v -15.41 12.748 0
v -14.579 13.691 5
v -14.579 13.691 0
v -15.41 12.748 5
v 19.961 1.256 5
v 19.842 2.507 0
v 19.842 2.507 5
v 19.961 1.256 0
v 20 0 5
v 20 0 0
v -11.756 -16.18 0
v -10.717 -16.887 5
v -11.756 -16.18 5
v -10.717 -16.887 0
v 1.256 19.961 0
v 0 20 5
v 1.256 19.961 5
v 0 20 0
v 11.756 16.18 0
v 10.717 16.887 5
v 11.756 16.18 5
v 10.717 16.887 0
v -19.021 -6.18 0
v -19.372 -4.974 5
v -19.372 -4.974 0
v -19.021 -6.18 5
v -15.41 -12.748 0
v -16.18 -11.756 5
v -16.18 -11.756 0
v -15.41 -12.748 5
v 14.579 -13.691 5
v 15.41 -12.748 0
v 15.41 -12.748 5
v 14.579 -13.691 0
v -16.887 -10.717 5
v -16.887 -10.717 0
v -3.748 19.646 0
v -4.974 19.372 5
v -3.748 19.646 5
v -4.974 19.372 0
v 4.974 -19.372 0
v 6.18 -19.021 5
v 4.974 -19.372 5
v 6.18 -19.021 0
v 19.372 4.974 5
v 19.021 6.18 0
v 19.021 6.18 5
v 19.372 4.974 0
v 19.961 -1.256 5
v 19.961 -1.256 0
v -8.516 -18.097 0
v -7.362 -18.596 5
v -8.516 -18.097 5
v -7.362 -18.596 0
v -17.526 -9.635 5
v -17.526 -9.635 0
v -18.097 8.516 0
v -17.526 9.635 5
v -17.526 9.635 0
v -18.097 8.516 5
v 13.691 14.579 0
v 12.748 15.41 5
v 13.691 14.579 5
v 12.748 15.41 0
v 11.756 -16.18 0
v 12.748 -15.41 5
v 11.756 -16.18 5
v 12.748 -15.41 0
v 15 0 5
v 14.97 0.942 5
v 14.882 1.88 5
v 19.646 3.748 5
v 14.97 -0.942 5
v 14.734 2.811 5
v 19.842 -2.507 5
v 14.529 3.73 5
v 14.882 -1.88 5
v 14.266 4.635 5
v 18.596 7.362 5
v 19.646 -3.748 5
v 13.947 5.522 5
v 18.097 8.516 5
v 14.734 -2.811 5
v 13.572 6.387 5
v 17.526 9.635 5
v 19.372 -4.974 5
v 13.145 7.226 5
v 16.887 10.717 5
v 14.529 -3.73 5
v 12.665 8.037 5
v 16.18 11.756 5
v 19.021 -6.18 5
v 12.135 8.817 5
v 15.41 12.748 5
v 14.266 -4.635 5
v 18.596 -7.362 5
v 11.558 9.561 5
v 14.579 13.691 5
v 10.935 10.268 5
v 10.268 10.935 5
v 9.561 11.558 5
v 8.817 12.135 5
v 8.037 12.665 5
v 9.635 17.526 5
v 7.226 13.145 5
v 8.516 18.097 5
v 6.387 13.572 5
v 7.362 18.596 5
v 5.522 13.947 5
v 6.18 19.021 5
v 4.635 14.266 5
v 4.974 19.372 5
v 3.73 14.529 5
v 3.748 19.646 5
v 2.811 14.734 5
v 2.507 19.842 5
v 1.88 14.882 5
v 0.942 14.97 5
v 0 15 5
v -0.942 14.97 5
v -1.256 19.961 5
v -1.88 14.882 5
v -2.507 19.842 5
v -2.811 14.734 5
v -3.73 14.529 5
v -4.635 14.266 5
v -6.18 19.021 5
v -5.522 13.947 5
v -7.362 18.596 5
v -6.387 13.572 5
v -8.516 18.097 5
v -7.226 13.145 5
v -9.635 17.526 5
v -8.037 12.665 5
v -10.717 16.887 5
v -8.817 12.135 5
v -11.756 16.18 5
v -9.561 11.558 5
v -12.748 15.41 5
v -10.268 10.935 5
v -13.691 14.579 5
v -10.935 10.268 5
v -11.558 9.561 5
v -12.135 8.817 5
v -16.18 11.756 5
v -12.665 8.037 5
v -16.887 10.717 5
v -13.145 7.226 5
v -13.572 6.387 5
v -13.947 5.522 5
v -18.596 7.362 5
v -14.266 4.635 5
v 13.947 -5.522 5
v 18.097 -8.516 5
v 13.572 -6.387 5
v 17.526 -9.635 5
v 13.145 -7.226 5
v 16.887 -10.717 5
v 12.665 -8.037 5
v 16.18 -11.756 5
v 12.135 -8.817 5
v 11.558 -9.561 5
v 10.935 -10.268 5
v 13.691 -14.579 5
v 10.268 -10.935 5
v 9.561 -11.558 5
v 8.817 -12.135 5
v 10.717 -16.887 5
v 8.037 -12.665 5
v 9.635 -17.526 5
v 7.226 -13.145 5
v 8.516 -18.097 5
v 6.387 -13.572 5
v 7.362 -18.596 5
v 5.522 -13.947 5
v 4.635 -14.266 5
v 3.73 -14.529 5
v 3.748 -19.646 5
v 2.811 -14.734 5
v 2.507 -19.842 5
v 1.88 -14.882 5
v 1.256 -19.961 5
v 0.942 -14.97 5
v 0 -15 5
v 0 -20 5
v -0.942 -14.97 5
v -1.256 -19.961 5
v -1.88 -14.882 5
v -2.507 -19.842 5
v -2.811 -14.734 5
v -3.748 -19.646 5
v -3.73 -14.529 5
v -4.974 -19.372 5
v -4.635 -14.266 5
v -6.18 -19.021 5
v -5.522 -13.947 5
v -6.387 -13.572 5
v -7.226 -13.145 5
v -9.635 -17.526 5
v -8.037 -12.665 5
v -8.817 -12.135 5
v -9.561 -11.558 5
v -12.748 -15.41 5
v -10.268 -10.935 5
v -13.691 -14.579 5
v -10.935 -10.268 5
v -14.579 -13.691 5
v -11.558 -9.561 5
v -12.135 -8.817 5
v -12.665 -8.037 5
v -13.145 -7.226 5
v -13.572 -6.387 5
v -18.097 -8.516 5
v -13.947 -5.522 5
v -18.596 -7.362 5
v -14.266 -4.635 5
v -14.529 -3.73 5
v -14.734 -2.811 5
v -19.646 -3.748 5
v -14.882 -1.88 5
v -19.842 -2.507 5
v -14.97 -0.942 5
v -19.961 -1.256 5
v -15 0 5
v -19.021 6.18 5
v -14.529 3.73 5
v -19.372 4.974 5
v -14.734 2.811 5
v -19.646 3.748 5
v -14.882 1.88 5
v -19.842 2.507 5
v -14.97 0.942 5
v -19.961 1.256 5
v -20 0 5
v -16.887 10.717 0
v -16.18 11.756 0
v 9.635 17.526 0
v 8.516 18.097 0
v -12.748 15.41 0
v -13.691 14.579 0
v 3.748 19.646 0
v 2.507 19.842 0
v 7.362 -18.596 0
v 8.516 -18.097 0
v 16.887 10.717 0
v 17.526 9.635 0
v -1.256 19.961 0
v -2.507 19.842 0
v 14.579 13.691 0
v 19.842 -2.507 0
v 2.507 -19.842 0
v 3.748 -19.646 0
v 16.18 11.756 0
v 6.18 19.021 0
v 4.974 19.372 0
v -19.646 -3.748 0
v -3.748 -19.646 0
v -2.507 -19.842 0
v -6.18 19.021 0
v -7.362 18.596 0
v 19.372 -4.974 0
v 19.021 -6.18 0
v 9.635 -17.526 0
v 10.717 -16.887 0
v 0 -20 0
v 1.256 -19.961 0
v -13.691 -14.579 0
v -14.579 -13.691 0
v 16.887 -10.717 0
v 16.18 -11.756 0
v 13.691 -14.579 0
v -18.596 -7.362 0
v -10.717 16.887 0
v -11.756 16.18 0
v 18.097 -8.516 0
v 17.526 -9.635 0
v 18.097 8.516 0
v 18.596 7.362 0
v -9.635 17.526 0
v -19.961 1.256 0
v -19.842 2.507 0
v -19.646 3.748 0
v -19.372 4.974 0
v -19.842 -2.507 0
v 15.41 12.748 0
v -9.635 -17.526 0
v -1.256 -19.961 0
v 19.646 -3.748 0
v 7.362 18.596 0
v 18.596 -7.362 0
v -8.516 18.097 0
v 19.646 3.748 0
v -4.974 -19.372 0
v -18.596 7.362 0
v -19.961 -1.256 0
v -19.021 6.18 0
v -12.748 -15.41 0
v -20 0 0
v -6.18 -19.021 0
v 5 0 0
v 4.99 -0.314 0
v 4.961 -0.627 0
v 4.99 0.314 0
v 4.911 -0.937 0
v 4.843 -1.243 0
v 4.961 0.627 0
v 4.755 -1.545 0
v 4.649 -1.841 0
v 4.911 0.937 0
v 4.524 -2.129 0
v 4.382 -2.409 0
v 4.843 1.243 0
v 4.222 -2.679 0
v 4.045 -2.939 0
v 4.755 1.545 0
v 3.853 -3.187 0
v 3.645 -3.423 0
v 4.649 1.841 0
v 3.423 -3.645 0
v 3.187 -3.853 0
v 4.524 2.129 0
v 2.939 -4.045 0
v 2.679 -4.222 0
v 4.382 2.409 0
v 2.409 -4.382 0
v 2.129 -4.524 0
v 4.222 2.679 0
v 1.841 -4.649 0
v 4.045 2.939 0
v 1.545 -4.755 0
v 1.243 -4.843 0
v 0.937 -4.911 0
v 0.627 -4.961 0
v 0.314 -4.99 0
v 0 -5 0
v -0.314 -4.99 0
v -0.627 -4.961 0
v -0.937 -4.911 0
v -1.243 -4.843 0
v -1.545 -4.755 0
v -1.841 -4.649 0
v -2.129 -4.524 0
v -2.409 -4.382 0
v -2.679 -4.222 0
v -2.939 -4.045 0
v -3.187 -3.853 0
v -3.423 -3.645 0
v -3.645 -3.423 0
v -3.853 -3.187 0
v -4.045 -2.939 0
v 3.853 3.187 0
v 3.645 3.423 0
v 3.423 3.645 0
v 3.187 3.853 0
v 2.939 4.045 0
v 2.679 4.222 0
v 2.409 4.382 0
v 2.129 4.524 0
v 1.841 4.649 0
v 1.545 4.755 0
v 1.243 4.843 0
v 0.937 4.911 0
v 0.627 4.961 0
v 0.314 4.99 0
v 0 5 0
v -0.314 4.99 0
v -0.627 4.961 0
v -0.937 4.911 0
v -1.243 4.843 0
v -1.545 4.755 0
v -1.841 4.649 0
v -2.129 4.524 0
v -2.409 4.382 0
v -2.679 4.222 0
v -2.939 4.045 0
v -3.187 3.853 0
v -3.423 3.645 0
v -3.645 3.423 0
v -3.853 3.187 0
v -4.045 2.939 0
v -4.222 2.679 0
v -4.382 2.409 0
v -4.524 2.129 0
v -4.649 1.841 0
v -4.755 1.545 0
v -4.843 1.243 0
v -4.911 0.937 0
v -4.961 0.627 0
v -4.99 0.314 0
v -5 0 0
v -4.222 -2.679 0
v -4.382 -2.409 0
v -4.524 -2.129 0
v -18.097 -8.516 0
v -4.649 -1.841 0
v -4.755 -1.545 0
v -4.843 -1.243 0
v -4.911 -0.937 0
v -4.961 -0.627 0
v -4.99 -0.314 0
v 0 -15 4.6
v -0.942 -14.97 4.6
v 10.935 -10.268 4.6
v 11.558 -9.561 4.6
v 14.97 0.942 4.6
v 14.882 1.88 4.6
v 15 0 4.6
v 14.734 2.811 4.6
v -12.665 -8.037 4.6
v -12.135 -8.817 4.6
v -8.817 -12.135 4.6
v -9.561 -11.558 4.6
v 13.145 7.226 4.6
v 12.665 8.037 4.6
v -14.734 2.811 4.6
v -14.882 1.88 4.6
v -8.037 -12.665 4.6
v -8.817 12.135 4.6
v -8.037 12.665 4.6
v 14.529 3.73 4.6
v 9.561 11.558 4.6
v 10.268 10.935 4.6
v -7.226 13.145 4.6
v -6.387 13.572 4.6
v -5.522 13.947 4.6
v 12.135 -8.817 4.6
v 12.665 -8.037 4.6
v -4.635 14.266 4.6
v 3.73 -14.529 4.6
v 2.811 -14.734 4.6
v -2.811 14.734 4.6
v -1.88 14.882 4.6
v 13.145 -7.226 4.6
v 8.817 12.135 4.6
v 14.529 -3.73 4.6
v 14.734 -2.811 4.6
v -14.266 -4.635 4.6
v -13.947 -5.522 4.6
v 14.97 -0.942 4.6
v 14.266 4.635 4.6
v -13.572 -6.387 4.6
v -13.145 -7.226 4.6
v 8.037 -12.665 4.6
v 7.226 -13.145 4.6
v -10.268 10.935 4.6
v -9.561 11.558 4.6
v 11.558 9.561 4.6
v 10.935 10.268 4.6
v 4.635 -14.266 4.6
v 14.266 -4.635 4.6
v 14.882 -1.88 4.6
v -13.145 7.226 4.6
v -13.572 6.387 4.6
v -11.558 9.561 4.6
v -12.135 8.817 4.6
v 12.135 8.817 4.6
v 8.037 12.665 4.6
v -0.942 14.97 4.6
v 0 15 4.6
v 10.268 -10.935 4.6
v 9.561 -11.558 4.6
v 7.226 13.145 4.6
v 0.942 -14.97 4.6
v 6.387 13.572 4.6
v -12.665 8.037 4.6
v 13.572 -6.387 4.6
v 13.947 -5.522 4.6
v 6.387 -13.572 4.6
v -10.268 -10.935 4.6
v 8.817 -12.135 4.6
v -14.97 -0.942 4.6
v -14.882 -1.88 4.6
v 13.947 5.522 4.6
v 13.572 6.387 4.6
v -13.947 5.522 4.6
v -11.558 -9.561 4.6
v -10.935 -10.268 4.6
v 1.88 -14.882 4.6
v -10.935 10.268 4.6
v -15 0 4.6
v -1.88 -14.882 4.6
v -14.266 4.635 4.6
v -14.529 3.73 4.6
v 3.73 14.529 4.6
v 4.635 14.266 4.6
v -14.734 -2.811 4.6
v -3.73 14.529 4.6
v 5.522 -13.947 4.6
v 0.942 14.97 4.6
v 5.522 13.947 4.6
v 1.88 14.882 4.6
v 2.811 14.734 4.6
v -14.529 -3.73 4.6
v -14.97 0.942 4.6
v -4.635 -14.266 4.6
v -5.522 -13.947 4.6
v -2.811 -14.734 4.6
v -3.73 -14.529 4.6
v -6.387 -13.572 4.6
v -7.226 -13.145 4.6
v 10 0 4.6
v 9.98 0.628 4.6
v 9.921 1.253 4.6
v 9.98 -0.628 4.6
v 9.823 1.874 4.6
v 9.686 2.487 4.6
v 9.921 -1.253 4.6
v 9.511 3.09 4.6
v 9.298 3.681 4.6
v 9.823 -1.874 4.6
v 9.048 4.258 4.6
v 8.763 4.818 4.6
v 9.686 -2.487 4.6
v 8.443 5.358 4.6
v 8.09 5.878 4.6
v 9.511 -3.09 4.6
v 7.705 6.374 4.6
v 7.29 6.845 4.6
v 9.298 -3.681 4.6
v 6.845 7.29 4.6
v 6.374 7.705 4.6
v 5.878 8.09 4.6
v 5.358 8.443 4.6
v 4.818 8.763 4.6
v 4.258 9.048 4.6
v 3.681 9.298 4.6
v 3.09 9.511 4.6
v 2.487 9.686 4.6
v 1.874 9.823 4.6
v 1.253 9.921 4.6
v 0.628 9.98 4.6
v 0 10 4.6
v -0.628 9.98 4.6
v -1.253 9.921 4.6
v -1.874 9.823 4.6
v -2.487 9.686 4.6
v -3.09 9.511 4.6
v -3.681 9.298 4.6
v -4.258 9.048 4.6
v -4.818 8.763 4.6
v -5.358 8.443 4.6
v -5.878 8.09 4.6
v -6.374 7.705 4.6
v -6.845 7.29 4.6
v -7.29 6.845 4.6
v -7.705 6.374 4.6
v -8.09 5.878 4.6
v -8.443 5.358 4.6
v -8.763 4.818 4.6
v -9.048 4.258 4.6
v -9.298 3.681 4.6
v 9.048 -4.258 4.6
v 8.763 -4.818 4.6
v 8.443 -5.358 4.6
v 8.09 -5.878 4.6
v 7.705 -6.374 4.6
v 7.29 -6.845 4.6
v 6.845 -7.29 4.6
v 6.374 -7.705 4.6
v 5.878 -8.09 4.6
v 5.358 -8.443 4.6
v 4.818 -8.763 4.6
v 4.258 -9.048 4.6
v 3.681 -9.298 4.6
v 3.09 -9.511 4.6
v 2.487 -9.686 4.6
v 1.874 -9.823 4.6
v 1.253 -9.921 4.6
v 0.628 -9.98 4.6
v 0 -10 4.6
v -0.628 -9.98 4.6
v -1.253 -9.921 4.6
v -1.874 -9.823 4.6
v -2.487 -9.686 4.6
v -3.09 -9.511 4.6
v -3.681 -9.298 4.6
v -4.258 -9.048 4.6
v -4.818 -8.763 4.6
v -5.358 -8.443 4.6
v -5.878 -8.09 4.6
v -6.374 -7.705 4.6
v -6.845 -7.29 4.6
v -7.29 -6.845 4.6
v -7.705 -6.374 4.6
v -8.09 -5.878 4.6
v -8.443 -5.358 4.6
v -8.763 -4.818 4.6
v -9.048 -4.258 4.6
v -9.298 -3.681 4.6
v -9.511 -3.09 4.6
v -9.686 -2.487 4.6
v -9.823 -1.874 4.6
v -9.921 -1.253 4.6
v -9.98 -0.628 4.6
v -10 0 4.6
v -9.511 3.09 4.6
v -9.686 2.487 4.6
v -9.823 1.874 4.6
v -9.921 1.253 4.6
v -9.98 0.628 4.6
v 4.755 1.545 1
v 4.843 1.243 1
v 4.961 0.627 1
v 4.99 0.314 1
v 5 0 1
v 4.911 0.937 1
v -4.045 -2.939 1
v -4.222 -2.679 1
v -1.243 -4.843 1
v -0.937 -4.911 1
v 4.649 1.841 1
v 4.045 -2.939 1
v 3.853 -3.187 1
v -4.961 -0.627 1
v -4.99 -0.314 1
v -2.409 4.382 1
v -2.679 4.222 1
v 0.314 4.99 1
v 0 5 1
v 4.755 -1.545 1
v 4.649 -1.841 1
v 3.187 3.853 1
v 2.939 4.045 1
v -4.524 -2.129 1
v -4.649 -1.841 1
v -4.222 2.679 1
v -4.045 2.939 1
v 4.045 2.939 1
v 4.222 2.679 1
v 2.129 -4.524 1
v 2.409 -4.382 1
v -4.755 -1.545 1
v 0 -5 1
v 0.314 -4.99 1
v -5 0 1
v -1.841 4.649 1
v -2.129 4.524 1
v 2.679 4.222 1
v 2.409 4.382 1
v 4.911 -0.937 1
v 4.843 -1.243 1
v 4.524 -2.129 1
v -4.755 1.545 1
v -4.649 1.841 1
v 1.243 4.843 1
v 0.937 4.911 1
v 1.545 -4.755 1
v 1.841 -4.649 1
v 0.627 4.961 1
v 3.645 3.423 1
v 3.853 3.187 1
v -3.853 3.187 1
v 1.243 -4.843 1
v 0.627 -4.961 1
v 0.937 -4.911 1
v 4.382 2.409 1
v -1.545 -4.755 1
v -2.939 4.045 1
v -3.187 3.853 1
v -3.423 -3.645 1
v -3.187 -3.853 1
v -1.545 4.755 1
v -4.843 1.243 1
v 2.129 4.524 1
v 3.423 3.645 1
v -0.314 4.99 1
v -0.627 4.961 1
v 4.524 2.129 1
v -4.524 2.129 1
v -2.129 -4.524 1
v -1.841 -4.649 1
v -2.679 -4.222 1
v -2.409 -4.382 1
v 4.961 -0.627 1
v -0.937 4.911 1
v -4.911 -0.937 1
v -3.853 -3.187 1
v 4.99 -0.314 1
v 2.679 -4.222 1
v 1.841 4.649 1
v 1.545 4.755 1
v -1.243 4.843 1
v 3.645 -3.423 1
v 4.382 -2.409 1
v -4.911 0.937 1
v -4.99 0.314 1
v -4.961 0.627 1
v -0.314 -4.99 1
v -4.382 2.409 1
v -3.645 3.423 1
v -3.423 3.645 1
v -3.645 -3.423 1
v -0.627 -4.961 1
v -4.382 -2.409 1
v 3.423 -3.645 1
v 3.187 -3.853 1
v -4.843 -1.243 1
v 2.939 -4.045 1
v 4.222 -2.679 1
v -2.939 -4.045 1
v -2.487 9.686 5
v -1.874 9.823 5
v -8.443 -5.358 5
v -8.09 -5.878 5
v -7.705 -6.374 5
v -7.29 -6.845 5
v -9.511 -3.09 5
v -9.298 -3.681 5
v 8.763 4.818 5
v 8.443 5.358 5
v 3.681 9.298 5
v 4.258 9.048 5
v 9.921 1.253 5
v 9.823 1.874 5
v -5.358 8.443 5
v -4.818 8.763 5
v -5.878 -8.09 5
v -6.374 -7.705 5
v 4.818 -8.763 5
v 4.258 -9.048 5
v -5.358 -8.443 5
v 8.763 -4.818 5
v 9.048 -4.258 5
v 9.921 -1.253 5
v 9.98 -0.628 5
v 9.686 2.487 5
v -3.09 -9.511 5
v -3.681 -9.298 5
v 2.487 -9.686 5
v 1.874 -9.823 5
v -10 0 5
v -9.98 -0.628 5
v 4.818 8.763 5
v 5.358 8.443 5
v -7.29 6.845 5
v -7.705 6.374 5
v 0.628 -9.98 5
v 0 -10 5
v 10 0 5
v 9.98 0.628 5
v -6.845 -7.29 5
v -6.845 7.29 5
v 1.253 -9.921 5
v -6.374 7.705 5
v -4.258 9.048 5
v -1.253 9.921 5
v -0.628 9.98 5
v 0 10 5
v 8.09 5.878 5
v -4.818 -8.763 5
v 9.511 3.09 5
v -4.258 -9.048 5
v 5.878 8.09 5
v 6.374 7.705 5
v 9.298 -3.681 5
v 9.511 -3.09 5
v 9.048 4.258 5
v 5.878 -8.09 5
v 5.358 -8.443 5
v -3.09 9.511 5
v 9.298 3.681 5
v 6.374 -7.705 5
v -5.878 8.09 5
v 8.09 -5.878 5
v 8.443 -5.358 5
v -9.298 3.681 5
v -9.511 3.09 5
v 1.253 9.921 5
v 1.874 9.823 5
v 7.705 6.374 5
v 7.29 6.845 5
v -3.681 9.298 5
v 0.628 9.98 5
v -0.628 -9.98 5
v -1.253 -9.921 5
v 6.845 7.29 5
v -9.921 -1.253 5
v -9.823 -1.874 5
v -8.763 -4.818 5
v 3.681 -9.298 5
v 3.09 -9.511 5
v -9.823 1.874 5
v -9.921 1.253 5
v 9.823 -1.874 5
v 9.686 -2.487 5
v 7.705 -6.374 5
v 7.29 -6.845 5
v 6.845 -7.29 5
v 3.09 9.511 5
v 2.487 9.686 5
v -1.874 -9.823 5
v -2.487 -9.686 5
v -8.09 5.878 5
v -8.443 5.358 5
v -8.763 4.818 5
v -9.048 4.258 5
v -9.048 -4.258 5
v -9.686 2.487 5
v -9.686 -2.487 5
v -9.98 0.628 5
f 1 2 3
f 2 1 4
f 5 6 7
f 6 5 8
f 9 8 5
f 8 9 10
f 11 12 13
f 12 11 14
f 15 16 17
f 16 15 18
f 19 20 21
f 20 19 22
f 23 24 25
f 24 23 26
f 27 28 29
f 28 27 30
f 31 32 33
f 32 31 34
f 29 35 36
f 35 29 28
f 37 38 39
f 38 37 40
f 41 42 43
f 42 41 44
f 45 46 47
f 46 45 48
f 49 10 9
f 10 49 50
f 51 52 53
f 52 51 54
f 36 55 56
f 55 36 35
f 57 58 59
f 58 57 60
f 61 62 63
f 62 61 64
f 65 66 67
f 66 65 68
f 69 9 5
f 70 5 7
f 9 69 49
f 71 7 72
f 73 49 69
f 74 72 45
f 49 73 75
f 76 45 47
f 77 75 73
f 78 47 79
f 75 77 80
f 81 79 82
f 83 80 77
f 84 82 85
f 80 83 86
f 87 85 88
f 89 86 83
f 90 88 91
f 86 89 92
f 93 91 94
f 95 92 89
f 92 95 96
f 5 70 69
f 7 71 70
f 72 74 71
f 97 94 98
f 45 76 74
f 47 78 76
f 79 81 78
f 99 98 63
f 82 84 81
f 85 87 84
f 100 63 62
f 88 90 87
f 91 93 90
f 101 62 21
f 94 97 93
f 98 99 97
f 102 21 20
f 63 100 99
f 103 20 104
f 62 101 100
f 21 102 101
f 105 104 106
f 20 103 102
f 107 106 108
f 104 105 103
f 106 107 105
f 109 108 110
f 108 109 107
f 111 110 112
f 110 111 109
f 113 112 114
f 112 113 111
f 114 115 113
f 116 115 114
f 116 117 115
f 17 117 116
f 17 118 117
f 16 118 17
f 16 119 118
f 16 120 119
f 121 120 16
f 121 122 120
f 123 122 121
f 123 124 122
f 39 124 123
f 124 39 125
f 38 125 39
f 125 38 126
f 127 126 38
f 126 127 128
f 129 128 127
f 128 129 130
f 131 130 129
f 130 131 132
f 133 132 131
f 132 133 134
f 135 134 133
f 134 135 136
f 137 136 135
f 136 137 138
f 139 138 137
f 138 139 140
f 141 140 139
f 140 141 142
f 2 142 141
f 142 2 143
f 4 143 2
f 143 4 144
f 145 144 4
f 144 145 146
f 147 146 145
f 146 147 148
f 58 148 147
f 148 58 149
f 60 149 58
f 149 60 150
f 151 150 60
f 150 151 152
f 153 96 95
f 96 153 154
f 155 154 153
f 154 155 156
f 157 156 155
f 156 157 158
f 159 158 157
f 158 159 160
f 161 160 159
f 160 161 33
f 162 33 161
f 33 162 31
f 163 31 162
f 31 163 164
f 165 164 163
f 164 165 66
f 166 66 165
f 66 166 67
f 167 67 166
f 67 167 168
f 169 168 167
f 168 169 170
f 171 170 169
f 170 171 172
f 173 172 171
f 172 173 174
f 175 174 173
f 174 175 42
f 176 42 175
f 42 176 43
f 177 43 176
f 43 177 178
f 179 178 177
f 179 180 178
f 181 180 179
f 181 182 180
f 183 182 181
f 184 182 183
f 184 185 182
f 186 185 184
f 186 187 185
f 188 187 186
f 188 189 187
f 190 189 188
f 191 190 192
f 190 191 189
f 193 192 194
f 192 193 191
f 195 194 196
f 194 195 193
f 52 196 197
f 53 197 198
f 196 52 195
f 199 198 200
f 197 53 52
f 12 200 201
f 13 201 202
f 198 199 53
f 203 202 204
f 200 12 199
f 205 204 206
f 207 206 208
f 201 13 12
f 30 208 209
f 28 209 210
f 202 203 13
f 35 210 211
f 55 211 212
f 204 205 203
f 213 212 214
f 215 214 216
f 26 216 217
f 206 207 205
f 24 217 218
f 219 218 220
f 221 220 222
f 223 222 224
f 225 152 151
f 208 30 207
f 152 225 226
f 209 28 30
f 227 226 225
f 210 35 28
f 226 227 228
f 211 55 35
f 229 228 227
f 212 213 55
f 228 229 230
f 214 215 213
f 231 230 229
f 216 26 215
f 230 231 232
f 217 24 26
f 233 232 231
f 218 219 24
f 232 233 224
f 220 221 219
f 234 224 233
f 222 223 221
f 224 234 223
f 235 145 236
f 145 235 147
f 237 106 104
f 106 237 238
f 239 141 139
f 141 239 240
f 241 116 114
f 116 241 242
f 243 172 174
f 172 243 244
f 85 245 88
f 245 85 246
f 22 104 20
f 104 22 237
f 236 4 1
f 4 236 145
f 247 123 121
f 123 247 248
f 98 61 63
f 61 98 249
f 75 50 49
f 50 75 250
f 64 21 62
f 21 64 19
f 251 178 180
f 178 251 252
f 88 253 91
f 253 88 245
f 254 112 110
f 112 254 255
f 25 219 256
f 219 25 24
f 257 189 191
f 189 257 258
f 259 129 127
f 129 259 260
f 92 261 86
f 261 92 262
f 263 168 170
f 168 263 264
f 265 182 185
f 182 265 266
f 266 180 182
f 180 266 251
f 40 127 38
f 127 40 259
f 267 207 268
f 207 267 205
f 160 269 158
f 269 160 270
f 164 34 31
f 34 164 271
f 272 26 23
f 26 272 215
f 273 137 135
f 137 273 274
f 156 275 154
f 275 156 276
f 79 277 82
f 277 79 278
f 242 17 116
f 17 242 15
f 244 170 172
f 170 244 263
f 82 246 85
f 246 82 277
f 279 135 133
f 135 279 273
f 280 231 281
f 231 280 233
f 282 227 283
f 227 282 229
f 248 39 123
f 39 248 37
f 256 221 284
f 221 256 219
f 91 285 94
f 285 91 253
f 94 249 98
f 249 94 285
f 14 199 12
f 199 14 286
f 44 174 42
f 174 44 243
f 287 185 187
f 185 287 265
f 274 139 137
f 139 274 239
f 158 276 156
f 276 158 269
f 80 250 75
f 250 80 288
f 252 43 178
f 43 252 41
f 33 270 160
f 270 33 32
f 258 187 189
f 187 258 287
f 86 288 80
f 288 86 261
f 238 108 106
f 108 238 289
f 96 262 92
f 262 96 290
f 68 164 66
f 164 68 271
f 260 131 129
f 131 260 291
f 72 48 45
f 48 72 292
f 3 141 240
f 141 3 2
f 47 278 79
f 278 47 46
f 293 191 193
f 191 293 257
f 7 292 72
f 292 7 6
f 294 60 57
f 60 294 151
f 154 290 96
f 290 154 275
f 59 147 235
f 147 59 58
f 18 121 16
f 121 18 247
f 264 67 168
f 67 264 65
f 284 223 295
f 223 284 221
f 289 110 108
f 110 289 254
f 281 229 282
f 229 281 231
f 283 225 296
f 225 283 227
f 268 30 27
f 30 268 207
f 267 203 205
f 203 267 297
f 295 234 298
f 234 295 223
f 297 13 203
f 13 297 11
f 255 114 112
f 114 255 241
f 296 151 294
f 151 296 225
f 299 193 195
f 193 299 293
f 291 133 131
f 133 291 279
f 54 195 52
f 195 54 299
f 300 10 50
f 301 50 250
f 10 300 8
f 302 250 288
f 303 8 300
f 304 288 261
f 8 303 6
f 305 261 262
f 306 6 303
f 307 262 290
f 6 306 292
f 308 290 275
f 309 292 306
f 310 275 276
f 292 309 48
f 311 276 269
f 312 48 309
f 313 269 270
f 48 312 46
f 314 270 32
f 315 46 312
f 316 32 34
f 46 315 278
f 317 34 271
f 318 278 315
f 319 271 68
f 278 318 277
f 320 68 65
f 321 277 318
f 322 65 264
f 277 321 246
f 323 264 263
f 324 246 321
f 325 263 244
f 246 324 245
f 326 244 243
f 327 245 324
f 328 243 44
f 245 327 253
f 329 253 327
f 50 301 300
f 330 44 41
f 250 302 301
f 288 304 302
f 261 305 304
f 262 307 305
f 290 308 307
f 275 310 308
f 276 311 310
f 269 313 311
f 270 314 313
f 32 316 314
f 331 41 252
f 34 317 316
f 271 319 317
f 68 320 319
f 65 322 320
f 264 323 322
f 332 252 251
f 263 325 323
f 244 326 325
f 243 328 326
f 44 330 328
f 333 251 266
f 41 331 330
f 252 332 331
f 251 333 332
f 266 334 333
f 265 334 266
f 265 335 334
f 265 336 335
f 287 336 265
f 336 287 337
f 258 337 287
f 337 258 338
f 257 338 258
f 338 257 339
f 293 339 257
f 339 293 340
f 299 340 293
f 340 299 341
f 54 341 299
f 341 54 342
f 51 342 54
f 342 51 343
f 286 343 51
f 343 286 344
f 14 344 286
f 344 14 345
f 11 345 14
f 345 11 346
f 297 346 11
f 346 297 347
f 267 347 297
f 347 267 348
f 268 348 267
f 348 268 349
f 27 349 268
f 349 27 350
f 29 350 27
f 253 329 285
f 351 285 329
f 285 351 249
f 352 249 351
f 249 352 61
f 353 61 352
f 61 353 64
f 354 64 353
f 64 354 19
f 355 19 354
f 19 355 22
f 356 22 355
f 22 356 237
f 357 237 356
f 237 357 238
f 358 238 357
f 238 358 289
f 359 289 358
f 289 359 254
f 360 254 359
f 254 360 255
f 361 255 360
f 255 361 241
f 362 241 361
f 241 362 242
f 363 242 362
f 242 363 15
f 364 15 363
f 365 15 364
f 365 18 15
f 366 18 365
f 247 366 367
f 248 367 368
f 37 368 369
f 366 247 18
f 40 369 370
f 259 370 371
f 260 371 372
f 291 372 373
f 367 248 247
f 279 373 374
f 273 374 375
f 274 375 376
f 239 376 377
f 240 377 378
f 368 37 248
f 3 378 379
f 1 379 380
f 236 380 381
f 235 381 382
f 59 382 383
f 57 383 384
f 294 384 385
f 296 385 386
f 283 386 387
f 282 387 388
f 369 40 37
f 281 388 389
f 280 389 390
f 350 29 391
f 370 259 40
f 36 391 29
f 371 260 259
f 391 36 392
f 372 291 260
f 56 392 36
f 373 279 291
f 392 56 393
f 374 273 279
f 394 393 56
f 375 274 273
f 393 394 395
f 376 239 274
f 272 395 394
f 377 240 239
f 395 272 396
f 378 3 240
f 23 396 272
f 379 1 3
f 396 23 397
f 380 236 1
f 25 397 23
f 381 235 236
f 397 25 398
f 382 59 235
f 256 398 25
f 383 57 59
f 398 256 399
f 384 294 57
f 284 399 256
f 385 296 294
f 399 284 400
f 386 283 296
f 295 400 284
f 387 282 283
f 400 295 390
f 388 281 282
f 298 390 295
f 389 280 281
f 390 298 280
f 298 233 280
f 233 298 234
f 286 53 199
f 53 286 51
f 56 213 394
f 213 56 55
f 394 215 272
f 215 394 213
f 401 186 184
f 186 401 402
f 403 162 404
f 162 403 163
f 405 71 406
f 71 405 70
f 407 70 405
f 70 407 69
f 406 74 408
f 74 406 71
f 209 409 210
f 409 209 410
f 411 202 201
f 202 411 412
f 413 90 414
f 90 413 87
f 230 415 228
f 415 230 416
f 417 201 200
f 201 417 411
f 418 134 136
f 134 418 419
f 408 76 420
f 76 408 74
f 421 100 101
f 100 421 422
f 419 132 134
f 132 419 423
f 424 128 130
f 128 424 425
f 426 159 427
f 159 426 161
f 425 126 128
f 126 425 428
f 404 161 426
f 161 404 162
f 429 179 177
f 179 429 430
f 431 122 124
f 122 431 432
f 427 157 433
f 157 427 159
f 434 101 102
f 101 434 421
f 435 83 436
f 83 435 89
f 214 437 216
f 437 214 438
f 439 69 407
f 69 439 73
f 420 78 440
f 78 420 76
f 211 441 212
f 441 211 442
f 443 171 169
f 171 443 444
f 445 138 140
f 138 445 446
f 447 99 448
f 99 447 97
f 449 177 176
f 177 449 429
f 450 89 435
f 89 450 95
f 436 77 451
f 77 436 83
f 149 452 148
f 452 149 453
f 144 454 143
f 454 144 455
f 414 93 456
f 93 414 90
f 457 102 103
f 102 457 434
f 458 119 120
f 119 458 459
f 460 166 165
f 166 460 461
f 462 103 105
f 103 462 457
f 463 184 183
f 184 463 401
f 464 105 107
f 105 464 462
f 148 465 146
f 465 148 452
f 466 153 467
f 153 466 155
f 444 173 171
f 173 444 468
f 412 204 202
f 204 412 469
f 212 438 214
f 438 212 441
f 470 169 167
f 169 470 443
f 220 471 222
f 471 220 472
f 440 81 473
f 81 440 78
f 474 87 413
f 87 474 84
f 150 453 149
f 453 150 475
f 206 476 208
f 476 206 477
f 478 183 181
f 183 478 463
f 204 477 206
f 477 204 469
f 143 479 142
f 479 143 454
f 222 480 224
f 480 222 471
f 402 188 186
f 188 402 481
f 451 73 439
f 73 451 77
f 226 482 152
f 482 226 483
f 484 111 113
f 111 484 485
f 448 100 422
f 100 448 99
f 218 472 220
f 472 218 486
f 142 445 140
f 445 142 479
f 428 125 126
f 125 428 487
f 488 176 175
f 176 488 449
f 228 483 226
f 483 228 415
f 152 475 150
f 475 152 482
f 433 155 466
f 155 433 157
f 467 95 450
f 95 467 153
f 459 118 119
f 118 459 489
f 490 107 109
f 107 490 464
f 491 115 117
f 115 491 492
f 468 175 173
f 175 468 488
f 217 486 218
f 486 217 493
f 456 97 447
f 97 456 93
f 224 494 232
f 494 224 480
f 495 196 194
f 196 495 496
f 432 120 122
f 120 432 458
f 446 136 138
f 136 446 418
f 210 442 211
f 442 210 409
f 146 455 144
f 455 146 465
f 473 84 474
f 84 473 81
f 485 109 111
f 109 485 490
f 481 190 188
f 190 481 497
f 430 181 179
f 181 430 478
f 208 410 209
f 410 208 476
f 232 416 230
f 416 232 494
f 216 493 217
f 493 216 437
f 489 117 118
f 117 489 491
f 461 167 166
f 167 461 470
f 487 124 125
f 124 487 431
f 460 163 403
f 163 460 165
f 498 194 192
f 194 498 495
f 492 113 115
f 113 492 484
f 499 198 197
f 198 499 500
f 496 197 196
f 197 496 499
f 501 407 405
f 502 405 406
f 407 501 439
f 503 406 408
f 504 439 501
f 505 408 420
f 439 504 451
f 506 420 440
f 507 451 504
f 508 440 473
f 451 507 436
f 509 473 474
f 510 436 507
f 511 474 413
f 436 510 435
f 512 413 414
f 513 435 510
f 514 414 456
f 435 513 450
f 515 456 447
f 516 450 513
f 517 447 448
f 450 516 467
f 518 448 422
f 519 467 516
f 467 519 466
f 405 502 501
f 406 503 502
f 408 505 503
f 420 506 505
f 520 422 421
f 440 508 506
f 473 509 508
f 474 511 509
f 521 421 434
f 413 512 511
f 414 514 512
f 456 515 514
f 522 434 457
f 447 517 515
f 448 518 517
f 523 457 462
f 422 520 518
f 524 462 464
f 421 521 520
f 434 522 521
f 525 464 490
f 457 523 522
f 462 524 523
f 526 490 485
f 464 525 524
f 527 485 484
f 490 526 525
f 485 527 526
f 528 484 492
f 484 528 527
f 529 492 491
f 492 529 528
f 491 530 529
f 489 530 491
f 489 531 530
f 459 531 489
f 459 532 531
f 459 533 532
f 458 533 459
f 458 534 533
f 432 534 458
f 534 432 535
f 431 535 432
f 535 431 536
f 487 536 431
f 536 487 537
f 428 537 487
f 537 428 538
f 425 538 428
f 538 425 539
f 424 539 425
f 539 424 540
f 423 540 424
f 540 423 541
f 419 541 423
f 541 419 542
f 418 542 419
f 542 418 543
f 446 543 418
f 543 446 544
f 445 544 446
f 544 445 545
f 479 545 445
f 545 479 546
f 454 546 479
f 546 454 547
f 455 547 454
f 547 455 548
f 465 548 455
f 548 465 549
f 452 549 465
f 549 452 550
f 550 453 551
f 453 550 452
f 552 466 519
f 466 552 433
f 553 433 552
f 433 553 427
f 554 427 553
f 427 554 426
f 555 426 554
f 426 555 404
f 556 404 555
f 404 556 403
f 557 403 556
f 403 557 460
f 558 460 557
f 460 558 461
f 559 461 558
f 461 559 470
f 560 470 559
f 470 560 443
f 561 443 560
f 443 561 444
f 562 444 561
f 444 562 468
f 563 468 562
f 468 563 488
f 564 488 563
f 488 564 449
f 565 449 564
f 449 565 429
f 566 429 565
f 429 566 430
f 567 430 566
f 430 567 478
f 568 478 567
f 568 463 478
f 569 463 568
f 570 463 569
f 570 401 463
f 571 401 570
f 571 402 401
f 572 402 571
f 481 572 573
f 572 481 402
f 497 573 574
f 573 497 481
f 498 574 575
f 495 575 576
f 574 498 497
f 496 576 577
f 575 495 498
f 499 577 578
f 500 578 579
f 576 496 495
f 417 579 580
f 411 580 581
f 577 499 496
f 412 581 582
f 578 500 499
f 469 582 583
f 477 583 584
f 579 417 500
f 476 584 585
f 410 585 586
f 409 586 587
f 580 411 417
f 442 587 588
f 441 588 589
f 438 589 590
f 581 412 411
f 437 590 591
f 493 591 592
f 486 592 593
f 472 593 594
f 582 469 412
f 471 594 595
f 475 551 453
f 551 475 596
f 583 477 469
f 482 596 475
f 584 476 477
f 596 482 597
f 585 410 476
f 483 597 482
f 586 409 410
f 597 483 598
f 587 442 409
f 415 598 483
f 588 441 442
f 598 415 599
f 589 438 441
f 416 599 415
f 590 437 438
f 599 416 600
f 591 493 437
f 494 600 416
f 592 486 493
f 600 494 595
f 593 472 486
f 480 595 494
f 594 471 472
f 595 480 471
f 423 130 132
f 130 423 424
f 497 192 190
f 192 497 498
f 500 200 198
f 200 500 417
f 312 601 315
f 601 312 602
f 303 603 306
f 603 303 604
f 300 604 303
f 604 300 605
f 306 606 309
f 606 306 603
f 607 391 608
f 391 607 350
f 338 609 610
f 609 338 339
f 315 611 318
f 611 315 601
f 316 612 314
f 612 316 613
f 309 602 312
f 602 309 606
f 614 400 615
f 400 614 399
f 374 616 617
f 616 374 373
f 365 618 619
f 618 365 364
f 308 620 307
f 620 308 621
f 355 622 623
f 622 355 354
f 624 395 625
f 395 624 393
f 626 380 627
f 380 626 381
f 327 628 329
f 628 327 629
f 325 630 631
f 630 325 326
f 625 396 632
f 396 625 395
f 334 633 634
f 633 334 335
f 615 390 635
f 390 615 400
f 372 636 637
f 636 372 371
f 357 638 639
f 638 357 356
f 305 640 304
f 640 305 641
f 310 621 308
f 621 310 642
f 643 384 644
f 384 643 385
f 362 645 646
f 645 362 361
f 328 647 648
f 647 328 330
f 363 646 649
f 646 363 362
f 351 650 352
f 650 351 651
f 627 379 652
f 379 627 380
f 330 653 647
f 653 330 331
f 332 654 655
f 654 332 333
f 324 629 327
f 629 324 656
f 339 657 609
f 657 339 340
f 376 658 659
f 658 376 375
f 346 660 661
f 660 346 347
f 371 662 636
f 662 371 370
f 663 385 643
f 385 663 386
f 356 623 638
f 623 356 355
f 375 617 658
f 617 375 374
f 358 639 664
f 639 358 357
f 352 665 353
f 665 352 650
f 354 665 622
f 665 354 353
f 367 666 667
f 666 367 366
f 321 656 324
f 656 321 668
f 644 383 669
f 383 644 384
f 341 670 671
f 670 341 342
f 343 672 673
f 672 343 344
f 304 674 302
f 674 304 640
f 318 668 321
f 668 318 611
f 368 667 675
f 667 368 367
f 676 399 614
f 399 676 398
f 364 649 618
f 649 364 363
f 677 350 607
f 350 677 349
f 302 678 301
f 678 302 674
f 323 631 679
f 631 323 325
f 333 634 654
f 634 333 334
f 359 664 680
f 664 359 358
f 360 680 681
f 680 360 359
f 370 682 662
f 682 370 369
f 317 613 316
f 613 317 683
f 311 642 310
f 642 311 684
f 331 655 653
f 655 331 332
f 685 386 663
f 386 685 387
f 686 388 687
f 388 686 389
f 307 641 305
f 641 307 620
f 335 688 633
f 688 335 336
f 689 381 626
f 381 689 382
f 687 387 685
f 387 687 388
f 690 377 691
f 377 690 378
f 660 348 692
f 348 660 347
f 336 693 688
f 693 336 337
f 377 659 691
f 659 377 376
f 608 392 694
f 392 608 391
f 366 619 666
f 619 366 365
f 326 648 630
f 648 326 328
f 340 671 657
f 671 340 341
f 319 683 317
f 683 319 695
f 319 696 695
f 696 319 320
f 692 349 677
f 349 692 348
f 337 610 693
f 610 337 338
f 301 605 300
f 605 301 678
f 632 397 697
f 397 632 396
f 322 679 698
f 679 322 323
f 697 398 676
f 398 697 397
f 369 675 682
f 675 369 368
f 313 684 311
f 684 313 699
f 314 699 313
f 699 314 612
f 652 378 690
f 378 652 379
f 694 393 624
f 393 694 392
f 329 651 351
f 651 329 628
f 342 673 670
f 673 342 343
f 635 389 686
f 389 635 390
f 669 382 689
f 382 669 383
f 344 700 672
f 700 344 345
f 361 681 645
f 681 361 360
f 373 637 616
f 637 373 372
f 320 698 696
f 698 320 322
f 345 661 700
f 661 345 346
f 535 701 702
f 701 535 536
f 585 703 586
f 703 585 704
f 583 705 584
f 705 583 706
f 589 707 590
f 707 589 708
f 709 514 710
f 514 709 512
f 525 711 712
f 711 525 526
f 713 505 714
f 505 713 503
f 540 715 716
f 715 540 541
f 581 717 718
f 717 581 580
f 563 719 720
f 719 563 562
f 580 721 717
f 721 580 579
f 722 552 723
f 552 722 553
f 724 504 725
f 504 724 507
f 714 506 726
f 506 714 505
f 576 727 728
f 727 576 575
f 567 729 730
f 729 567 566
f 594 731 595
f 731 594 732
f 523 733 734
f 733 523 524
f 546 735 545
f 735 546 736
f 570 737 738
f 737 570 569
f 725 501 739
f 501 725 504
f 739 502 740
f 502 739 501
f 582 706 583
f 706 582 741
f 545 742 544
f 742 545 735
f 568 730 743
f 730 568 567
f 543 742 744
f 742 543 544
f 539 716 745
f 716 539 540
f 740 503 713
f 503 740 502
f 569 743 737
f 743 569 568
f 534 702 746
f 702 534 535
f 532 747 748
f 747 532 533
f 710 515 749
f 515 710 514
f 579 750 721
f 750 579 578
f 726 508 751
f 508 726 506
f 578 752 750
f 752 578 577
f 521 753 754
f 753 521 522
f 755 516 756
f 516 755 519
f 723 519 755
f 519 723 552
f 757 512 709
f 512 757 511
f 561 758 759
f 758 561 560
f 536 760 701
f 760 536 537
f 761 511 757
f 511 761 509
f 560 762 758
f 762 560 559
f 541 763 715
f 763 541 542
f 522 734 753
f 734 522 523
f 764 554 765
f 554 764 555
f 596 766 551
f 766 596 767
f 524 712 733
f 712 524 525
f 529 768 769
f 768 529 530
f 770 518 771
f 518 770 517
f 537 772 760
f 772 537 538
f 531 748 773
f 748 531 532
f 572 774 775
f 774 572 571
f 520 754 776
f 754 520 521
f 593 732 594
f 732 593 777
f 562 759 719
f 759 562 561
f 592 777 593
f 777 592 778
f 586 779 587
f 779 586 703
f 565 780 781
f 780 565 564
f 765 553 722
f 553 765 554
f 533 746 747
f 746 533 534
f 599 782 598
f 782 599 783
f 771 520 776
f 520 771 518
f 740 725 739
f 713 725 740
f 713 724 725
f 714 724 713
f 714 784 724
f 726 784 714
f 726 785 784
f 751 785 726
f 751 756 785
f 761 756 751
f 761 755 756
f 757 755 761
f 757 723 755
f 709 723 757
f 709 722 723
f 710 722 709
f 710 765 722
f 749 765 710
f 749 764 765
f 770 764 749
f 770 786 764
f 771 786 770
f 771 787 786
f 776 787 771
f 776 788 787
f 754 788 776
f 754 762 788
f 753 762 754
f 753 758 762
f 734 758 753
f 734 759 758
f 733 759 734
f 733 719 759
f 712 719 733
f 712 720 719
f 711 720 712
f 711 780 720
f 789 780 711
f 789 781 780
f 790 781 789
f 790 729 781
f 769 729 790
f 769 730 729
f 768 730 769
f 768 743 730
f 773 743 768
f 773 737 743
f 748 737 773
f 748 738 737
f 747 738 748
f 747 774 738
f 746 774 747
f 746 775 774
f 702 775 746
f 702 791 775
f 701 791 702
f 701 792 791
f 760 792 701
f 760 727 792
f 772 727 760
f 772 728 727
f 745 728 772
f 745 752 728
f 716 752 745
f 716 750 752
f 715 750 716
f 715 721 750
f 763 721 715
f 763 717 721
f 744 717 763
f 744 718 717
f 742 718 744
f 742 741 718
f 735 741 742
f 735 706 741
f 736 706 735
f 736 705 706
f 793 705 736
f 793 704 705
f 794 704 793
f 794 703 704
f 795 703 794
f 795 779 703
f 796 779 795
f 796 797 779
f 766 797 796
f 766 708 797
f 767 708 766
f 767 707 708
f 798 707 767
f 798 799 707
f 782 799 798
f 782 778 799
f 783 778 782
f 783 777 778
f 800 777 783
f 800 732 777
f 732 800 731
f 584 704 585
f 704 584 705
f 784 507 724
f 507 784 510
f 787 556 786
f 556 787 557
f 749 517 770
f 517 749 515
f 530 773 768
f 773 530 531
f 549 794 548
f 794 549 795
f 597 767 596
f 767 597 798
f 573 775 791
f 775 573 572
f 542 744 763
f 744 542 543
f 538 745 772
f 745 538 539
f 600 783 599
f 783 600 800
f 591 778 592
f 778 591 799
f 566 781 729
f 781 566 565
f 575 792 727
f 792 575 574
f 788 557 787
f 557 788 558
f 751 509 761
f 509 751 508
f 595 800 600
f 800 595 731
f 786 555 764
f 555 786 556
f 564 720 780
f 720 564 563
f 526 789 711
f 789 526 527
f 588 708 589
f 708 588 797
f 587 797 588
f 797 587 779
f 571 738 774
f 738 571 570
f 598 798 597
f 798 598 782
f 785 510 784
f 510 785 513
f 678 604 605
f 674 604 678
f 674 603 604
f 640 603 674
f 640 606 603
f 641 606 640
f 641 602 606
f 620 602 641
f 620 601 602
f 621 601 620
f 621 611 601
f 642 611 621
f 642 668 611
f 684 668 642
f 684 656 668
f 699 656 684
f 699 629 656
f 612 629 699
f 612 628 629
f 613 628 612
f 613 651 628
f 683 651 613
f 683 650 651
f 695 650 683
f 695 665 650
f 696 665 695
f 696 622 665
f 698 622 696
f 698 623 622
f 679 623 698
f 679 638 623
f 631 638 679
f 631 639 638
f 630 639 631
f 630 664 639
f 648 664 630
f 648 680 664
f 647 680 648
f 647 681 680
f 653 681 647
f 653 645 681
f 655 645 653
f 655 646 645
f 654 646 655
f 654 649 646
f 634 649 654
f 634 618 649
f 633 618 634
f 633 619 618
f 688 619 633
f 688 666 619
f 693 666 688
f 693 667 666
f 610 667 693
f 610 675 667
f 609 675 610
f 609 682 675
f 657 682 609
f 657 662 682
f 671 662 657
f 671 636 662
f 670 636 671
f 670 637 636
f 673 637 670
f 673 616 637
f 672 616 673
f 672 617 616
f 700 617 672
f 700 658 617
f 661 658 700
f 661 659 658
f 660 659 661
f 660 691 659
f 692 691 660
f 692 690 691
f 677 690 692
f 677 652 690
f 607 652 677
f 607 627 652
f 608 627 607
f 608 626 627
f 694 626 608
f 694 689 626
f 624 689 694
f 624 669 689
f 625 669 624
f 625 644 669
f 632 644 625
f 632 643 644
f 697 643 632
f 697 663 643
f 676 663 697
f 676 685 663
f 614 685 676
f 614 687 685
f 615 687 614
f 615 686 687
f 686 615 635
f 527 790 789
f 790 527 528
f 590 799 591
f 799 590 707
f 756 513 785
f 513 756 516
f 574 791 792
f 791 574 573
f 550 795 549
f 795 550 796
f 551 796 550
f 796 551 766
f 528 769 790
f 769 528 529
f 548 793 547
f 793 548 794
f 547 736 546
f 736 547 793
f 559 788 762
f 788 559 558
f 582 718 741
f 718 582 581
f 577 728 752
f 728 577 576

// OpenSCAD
$fn=100;
color ([0,0,0]) {
difference () {
cylinder (5,20,20);
translate([0,0,4.6]) cylinder (2,15,15);
translate ([0,0,-0.1])cylinder (1.97,5,5);
}
translate ([0,0,1])cylinder (4,10,10);
}
